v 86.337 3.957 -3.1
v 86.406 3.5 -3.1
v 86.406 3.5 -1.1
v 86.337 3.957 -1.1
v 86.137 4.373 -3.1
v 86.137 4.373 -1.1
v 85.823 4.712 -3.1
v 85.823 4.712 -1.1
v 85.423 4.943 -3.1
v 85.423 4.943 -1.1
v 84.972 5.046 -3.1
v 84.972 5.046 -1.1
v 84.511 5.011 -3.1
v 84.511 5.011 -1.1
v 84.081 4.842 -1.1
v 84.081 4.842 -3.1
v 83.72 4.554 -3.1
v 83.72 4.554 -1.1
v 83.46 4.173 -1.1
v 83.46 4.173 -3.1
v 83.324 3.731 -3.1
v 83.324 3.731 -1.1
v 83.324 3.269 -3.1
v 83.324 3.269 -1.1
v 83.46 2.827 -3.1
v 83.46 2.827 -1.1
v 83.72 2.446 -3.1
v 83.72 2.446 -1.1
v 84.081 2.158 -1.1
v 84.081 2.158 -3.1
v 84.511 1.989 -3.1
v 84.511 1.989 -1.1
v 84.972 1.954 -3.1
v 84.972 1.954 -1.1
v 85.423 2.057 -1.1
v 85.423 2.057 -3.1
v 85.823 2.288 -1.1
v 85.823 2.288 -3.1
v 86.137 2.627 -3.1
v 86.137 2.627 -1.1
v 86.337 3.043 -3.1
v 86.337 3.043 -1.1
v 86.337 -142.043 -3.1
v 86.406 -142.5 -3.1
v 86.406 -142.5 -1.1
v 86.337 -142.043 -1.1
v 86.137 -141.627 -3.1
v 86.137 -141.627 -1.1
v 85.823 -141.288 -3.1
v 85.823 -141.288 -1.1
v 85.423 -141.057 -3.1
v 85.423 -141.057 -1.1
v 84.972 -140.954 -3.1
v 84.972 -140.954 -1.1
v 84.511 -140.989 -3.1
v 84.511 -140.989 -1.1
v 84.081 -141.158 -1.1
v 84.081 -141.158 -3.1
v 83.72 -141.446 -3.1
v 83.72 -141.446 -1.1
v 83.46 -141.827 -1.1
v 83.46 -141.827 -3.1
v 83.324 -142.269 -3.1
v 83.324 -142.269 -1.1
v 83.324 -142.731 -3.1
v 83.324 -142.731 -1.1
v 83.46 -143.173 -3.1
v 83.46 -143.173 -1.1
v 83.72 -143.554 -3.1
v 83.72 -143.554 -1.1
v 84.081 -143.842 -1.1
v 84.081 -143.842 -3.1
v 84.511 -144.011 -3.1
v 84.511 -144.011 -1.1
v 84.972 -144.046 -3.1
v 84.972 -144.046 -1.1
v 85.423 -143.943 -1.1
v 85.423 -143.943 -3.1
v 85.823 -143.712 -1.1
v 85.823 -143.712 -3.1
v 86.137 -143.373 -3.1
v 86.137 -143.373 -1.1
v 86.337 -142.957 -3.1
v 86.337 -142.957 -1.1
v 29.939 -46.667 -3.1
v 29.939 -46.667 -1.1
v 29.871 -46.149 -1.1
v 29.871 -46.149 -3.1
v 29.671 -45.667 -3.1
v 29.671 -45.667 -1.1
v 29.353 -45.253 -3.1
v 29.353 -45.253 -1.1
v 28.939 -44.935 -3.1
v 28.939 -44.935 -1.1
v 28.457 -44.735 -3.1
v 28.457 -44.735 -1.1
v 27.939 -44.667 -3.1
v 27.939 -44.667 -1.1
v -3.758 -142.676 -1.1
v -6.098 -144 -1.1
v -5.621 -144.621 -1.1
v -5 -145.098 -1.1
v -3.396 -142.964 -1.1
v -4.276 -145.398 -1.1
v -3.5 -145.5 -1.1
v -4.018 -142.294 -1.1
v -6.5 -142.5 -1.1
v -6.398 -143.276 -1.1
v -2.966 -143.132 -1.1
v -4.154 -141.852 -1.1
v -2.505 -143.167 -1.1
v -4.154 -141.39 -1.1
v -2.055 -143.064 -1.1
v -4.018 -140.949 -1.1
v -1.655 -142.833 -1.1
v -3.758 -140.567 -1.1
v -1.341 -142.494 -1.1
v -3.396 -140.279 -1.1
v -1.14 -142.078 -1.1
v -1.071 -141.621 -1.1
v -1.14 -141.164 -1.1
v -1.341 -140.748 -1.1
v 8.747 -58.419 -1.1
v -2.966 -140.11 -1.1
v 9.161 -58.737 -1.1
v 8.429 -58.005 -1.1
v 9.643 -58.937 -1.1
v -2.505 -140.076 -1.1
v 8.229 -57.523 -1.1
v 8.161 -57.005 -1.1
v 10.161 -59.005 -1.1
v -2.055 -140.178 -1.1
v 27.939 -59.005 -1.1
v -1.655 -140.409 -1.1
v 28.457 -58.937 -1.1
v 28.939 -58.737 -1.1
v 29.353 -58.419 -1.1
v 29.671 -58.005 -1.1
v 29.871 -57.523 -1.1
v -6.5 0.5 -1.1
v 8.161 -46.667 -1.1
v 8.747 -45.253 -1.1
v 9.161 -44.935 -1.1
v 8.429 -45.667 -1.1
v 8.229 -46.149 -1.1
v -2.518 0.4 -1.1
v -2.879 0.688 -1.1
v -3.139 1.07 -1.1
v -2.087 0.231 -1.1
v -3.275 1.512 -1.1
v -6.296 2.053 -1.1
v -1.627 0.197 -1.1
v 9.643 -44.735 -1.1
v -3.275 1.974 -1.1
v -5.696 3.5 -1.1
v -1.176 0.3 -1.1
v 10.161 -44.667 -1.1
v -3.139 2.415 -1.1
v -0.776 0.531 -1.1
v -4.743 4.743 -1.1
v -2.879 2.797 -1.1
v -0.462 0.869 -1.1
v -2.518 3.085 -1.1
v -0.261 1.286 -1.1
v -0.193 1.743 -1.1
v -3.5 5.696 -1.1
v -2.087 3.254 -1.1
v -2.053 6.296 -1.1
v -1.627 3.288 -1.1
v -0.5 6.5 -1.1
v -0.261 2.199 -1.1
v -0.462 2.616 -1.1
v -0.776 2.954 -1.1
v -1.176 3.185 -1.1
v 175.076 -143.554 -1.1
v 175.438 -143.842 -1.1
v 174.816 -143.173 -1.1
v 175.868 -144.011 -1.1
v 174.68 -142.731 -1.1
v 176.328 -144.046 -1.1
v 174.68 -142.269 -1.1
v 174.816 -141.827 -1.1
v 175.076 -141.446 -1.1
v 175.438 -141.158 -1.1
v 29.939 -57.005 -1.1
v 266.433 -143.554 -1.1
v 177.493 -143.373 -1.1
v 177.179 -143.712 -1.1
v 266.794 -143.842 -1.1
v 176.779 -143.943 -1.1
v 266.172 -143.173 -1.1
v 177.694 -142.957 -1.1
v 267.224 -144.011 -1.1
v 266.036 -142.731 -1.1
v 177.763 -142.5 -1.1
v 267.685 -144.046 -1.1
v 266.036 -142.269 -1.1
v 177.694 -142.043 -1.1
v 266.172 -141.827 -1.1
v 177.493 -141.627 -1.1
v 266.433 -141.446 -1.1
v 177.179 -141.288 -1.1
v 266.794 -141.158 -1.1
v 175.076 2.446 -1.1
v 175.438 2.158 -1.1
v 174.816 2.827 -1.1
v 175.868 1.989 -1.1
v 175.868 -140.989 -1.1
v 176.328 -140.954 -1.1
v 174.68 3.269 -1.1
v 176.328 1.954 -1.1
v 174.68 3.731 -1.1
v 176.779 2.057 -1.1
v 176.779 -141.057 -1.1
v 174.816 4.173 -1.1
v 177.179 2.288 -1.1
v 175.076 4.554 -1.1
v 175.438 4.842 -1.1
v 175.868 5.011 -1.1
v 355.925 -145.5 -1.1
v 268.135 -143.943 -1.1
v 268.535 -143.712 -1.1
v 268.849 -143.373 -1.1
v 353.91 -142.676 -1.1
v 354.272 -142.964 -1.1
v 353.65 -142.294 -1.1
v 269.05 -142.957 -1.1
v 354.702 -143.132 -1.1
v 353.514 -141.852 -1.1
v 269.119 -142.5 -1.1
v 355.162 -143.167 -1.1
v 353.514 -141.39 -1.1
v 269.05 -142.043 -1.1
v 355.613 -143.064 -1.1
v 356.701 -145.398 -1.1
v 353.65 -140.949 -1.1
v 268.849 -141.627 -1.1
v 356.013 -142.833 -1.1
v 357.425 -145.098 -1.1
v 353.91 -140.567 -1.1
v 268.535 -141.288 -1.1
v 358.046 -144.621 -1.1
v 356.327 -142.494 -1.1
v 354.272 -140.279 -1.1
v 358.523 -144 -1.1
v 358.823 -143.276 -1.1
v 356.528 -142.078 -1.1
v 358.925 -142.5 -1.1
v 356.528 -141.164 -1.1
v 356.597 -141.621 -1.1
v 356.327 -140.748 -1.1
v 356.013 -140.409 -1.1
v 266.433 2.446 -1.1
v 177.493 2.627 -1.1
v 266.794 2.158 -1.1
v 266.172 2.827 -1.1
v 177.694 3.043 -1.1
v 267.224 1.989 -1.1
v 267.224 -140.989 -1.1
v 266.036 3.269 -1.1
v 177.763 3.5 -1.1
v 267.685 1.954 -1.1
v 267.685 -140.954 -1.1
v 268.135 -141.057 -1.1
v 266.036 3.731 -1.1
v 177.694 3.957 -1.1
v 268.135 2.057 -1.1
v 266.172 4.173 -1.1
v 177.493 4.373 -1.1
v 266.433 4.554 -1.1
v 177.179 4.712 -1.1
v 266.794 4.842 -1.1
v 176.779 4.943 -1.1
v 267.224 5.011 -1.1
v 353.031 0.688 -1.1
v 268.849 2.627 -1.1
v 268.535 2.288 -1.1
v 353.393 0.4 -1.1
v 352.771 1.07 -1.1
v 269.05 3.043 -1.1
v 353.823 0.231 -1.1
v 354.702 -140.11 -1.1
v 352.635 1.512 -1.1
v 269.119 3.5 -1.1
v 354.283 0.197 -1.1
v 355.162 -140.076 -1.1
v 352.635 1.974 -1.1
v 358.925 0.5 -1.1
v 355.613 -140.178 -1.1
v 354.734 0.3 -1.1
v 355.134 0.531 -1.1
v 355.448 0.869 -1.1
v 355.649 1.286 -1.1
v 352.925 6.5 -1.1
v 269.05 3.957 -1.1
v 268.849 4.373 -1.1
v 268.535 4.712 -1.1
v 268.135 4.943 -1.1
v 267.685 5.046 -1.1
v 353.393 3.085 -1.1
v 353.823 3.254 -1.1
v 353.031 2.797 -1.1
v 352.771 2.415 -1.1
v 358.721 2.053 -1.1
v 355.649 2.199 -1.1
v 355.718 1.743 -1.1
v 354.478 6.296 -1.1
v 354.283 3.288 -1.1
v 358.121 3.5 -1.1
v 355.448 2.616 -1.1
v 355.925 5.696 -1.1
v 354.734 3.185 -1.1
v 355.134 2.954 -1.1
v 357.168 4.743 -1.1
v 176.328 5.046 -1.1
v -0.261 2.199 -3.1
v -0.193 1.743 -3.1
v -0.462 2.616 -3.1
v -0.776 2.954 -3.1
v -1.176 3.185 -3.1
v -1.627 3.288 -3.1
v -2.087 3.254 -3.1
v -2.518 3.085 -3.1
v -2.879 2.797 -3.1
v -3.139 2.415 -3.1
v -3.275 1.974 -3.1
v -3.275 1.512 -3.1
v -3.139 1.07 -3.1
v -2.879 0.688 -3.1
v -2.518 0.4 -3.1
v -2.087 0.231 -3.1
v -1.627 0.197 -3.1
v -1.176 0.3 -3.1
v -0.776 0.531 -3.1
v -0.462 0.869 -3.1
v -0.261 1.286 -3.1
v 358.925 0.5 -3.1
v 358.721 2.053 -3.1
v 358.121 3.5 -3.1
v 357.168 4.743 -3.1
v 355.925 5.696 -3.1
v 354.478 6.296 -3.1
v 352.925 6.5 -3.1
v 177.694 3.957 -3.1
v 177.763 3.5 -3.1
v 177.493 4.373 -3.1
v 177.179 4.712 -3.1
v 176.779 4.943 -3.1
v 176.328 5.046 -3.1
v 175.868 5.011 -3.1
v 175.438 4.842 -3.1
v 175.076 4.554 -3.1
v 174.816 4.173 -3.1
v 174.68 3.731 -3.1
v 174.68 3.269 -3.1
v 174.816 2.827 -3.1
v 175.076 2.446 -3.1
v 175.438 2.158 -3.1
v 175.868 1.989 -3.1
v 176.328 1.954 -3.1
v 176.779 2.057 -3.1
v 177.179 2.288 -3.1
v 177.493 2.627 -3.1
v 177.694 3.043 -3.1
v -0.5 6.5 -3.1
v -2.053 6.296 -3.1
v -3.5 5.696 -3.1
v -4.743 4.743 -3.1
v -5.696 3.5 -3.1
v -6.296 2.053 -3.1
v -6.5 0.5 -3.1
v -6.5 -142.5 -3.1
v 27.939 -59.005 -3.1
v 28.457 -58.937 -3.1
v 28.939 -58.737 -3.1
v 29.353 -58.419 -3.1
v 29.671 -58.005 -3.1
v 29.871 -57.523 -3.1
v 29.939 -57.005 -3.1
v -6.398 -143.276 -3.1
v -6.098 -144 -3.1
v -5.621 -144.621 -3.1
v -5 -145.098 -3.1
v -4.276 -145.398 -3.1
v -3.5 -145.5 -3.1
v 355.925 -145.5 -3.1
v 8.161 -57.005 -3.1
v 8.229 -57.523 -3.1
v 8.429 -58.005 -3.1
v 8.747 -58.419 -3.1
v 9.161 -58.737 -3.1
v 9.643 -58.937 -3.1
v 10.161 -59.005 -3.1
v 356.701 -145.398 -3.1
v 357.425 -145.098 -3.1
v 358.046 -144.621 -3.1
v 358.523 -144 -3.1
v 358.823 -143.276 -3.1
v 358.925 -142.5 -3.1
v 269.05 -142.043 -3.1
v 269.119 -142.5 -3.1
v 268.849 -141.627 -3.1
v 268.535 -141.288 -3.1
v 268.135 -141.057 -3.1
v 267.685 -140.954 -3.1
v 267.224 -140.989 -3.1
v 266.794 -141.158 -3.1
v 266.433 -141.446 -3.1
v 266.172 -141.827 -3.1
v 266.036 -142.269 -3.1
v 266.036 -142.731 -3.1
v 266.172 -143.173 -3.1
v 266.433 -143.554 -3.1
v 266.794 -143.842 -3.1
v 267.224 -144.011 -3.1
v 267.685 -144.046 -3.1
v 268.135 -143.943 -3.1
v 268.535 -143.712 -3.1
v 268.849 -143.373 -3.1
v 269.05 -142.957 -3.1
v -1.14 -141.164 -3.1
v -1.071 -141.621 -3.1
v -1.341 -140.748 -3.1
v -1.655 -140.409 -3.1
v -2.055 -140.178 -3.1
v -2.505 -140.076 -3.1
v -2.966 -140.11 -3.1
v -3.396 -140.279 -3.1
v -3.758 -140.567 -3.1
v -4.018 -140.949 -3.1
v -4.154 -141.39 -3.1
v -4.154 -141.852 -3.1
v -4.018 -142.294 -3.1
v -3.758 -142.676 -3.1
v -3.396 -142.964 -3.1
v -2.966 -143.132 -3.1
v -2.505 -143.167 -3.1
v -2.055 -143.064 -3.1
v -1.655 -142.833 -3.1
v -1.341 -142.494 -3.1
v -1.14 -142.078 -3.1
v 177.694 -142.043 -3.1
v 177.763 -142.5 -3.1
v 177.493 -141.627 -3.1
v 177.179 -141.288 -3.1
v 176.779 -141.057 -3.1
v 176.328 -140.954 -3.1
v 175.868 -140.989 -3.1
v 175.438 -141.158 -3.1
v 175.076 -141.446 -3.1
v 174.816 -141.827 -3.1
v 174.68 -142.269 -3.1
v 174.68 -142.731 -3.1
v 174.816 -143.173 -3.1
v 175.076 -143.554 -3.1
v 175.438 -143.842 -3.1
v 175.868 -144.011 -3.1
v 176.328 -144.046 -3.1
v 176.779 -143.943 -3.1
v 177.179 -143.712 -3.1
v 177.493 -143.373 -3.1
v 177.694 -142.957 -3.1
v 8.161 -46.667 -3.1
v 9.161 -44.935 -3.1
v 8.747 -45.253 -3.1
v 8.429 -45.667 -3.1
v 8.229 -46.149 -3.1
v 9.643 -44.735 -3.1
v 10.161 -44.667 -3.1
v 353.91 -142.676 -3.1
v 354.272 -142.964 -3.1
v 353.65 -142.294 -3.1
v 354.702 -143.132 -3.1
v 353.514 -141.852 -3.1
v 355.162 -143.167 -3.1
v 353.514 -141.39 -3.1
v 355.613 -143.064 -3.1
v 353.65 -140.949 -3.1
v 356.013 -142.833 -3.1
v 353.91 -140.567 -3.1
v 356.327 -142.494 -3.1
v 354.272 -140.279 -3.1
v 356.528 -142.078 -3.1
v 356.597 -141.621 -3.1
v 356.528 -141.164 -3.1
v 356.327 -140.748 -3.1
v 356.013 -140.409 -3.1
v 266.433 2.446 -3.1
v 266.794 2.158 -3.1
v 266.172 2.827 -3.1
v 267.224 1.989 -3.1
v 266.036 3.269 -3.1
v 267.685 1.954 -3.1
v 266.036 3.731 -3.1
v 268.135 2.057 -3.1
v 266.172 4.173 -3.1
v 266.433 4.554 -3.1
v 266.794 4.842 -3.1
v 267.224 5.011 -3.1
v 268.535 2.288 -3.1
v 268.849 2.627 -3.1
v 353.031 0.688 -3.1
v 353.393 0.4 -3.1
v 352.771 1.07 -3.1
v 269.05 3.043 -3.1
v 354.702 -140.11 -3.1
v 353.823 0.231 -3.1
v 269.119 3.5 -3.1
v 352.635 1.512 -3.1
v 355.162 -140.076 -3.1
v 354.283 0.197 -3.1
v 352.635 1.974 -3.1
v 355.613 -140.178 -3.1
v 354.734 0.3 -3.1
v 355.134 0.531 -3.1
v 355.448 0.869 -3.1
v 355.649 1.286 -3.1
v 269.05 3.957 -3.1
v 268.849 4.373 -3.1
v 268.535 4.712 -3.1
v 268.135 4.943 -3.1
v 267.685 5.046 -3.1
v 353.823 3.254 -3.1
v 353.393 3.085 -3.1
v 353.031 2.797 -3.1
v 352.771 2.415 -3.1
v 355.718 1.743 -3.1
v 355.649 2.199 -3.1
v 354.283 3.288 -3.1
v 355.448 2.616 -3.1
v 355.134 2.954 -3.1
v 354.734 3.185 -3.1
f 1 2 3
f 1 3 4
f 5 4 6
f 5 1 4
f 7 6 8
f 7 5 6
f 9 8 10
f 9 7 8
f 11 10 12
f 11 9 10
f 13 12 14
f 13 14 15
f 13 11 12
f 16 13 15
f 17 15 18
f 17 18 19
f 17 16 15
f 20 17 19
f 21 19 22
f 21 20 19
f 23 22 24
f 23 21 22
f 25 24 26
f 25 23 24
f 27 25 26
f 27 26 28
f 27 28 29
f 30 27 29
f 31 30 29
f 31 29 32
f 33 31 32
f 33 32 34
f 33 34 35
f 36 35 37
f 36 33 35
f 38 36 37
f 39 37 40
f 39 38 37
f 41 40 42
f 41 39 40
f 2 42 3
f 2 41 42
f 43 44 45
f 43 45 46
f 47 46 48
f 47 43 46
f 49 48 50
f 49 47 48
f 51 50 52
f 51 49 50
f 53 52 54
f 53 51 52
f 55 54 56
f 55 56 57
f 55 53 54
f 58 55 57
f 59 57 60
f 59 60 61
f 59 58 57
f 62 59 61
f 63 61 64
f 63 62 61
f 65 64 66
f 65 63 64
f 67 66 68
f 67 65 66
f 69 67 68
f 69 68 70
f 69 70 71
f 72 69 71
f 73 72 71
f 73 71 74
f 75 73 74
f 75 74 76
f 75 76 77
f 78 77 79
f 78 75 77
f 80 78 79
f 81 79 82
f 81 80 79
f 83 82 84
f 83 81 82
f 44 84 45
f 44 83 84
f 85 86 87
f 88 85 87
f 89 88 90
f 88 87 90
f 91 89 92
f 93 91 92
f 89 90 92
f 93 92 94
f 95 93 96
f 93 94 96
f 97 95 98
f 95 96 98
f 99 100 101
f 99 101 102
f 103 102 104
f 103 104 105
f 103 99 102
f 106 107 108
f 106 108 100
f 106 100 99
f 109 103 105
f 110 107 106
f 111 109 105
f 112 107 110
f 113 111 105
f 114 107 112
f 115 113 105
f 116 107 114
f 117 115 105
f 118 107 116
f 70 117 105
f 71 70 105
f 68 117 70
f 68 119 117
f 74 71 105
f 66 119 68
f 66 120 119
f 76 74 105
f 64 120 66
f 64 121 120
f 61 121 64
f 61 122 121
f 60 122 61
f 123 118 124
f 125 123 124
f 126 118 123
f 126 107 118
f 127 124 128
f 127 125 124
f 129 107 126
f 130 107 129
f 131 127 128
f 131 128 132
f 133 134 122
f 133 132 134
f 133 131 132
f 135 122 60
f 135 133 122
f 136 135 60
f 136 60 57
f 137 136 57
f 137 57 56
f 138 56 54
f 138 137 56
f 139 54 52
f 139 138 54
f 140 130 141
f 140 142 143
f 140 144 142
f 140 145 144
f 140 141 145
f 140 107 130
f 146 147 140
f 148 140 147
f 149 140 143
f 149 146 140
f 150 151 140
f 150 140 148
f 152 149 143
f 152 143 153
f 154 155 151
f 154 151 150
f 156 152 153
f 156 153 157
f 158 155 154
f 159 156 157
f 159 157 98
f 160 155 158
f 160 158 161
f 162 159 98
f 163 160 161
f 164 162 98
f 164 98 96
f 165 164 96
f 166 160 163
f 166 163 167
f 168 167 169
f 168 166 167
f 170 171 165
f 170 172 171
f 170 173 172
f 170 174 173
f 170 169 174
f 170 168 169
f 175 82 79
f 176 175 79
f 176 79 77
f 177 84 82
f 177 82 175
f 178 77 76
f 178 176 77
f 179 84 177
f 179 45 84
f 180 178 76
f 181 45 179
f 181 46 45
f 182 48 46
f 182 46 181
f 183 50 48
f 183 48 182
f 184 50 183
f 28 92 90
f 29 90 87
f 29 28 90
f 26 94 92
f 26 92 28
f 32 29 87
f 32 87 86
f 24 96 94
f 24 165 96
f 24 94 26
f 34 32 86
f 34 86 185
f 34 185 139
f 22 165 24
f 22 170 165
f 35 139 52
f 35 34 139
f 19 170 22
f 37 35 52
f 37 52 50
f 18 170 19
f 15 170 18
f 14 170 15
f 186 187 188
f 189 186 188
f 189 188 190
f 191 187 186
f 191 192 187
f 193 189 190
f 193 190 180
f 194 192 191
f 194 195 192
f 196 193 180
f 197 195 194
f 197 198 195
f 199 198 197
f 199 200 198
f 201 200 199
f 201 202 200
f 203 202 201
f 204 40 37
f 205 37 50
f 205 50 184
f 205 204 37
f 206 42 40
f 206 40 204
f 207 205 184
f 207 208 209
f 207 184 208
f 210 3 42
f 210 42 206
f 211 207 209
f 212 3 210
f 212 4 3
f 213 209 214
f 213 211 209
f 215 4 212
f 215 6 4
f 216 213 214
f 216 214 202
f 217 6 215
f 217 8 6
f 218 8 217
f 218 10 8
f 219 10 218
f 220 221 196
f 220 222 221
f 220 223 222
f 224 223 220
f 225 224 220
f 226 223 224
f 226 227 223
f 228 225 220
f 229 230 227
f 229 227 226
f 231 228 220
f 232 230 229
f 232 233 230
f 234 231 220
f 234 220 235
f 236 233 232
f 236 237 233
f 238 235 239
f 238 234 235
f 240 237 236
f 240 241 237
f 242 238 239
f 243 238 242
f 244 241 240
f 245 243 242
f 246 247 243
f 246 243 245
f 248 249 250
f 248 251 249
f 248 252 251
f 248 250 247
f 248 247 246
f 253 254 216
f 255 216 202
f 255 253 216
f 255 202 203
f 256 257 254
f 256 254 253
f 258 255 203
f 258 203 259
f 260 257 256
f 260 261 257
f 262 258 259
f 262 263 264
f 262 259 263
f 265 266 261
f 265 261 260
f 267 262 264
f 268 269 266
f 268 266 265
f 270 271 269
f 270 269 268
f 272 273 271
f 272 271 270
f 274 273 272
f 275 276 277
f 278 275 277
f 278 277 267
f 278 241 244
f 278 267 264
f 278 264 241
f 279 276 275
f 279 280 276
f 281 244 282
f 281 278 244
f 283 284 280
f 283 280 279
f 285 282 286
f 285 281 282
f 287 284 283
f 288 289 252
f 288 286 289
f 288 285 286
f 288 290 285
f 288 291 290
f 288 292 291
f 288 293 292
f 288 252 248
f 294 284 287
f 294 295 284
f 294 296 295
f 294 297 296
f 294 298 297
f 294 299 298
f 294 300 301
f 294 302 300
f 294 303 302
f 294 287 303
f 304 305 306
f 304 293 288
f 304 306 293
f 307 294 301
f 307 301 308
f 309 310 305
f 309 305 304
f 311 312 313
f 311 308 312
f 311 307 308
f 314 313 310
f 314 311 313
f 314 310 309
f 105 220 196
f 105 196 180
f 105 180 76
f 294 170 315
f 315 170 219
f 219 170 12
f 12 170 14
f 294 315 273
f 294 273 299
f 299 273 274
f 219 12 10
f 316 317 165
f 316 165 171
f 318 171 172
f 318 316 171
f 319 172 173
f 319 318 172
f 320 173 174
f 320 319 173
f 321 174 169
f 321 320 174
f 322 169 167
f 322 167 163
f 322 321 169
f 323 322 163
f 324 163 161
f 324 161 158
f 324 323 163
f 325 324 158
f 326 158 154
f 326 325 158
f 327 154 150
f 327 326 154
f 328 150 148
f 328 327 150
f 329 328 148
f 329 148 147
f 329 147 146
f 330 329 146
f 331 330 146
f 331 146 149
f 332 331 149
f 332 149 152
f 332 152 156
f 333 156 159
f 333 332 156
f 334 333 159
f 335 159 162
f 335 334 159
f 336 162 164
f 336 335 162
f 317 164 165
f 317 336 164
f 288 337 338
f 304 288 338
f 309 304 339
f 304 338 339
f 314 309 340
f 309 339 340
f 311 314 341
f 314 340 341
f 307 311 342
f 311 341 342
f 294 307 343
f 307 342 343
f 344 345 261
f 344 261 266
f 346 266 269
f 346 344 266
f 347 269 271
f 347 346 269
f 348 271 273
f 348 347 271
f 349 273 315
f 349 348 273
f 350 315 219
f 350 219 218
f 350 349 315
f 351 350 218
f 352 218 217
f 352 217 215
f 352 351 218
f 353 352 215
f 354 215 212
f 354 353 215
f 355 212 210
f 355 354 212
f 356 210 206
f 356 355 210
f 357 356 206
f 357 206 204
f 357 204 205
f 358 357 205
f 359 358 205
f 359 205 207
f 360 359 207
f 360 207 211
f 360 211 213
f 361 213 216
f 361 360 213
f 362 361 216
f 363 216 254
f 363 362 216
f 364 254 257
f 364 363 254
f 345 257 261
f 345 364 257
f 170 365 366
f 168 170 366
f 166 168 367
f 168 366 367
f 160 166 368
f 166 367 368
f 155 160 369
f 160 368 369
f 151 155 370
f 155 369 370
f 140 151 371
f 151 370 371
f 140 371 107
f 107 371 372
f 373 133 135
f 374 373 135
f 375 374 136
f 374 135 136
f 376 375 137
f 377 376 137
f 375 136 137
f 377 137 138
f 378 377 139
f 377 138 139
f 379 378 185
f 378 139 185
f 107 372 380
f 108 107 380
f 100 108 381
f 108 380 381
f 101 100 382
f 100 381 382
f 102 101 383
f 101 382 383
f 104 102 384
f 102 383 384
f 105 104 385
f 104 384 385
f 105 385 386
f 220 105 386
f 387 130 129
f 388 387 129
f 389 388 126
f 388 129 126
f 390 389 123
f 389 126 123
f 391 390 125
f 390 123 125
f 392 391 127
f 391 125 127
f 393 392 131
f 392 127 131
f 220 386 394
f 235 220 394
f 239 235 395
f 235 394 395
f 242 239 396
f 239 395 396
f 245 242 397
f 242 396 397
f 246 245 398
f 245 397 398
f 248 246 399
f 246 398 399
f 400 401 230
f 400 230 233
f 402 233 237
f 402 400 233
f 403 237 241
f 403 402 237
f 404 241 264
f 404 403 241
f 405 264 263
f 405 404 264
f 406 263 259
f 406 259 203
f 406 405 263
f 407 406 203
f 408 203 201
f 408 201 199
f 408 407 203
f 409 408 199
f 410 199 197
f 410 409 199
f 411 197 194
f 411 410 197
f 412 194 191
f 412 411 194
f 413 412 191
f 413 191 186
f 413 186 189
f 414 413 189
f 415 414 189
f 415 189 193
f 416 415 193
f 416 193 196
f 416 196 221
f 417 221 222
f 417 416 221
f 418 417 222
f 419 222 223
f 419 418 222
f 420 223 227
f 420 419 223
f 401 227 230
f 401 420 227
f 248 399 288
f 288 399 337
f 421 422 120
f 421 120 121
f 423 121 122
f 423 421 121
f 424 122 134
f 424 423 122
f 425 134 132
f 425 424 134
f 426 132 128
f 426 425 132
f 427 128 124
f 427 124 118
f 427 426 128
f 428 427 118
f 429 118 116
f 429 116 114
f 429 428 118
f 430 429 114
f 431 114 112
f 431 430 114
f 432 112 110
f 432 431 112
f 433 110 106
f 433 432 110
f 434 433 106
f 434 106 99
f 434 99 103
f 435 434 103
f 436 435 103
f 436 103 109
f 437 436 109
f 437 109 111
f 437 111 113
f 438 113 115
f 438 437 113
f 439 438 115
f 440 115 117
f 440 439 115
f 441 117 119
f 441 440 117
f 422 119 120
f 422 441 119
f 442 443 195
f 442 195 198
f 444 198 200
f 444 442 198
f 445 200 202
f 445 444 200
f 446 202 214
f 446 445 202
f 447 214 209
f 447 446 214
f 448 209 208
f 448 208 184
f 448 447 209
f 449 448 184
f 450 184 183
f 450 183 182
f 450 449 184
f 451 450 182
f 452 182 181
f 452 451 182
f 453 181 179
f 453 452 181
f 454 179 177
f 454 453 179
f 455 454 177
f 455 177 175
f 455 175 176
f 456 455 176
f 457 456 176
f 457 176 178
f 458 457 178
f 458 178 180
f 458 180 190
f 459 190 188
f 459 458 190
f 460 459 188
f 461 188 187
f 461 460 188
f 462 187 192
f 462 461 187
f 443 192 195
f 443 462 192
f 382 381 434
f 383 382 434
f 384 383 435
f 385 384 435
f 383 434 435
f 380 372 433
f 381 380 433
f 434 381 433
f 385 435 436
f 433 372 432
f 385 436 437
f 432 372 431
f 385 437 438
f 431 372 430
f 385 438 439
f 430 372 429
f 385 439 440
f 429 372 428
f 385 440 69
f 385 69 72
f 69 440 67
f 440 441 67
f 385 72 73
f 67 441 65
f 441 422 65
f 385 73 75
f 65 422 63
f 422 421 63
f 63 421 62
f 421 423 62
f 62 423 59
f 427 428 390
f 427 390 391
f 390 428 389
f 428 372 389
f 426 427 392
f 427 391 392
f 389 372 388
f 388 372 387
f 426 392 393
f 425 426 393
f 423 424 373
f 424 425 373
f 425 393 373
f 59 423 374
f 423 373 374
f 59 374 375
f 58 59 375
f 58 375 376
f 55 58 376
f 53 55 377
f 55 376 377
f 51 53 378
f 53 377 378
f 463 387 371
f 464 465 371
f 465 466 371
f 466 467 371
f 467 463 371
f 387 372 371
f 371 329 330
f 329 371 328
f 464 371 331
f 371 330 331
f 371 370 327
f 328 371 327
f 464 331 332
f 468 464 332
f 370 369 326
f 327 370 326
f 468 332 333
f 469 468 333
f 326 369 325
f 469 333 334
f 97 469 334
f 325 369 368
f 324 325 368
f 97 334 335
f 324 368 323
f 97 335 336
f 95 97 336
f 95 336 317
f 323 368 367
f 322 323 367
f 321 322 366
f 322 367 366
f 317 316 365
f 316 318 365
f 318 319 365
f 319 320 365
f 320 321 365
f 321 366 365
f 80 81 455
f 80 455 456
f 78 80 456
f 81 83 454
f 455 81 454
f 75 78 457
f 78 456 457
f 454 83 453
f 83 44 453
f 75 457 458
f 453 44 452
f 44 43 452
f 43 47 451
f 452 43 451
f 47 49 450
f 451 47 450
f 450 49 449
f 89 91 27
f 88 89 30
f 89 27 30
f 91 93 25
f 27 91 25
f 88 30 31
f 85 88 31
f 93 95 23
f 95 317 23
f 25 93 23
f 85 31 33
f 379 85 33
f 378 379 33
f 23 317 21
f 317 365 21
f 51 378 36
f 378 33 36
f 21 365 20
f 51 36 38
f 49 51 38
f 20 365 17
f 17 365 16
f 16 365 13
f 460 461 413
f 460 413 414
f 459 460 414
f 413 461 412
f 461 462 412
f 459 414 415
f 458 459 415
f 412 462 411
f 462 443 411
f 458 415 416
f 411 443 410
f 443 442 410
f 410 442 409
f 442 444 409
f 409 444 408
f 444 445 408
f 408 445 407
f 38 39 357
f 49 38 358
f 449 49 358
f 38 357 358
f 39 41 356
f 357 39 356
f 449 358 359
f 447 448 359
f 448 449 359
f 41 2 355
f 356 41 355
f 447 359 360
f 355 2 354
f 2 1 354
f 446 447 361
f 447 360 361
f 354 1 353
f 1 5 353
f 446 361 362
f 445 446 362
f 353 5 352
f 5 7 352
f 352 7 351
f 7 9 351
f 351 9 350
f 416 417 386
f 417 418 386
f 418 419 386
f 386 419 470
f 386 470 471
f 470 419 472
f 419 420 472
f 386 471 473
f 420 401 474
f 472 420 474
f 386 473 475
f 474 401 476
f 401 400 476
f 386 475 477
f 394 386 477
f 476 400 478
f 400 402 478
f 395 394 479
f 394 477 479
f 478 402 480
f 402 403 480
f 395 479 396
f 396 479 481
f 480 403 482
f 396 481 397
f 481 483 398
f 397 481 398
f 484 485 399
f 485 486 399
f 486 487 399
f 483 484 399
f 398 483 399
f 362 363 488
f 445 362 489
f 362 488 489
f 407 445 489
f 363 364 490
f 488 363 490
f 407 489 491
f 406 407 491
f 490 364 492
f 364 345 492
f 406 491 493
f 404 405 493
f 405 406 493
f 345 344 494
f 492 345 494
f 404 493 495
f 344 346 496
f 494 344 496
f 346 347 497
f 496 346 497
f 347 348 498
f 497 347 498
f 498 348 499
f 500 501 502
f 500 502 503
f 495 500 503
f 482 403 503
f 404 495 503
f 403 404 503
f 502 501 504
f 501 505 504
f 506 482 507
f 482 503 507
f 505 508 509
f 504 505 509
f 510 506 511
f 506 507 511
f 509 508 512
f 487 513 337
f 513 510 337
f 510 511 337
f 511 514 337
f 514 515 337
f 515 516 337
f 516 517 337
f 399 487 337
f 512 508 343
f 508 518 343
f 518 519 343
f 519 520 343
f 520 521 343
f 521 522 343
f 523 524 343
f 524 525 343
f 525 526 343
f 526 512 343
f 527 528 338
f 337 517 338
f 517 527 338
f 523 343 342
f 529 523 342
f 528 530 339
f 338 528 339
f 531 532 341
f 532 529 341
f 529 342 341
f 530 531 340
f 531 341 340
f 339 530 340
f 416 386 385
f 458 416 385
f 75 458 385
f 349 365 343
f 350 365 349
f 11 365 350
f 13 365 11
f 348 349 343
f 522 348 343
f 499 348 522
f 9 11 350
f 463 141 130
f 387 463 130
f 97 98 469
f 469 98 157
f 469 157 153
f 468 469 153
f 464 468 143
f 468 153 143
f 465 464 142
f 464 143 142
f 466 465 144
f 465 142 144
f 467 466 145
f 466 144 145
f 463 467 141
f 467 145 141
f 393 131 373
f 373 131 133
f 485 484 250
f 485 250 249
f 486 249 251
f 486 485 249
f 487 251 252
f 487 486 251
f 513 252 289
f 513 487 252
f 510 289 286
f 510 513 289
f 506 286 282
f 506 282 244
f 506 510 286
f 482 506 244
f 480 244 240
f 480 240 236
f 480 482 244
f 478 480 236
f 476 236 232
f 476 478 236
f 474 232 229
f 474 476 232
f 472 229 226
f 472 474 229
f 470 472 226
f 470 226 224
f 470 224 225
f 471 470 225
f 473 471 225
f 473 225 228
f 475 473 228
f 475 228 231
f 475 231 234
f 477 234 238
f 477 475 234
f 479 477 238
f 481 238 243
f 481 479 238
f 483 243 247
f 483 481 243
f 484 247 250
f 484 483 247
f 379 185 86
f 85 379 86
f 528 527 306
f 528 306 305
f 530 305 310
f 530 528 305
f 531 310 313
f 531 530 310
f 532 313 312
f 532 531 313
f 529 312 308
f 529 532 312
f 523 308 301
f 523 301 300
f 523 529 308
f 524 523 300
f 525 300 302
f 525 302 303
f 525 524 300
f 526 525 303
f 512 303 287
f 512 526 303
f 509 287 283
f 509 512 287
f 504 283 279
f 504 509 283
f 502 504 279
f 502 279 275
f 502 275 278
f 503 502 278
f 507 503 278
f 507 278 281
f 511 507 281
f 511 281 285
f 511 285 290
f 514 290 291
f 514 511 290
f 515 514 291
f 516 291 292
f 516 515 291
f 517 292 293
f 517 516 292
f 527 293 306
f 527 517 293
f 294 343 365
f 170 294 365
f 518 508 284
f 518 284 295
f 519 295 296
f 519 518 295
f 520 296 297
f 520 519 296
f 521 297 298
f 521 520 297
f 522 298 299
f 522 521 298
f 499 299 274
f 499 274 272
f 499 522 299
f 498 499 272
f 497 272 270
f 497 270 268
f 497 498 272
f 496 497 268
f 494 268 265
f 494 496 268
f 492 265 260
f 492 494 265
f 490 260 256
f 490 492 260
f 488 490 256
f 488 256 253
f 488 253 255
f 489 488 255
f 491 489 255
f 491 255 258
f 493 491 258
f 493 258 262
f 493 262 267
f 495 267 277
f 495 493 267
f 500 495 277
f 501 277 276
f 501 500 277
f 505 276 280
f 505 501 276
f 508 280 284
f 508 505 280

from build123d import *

# Parameters (mm, degrees)
SKETCH076_R     = 1.55
PAD015_DEPTH    = 2
POCKET060_DEPTH = 5
SKETCH078_R     = 1.55
POCKET061_DEPTH = 1
SKETCH079_R     = 4.05
POCKET062_DEPTH = 1


with BuildPart() as part:
    # Sketch076 → Pad015 (new body)
    with BuildSketch(Plane.XY.offset(2.9)):
        with BuildLine():
            Line((-6.5, 0.5), (-6.5, -142.5))
            ThreePointArc((-6.5, -142.5), (-5.62132, -144.62132), (-3.5, -145.5))
            Line((-3.5, -145.5), (355.925, -145.5))
            ThreePointArc((355.925, -145.5), (358.04632, -144.62132), (358.925, -142.5))
            Line((358.925, -142.5), (358.925, 0.5))
            ThreePointArc((358.925, 0.5), (357.167641, 4.742641), (352.925, 6.5))
            Line((352.925, 6.5), (-0.5, 6.5))
            ThreePointArc((-0.5, 6.5), (-4.742641, 4.742641), (-6.5, 0.5))
        make_face()
        with Locations((-1.742592, 1.742608)):
            Circle(SKETCH076_R, mode=Mode.SUBTRACT)
        with Locations((354.167592, 1.742608)):
            Circle(SKETCH076_R, mode=Mode.SUBTRACT)
        with Locations((84.85625, 3.5)):
            Circle(SKETCH076_R, mode=Mode.SUBTRACT)
        with Locations((176.2125, 3.5)):
            Circle(SKETCH076_R, mode=Mode.SUBTRACT)
        with Locations((267.56875, 3.5)):
            Circle(SKETCH076_R, mode=Mode.SUBTRACT)
        with Locations((84.85625, -142.5)):
            Circle(SKETCH076_R, mode=Mode.SUBTRACT)
        with Locations((176.2125, -142.5)):
            Circle(SKETCH076_R, mode=Mode.SUBTRACT)
        with Locations((267.56875, -142.5)):
            Circle(SKETCH076_R, mode=Mode.SUBTRACT)
        with Locations((-2.621271, -141.621287)):
            Circle(SKETCH076_R, mode=Mode.SUBTRACT)
        with Locations((355.046623, -141.621325)):
            Circle(SKETCH076_R, mode=Mode.SUBTRACT)
    extrude(amount=PAD015_DEPTH)

    # Sketch077 → Pocket060 (cut)
    with BuildSketch(Plane.XY.offset(6)):
        with BuildLine():
            Line((8.160893, -46.667019), (8.160893, -57.005055))
            ThreePointArc((8.160893, -57.005055), (8.74668, -58.419268), (10.160893, -59.005055))
            Line((10.160893, -59.005055), (27.939107, -59.005055))
            ThreePointArc((27.939107, -59.005055), (29.35332, -58.419268), (29.939107, -57.005055))
            Line((29.939107, -57.005055), (29.939107, -46.667019))
            ThreePointArc((29.939107, -46.667019), (29.35332, -45.252805), (27.939107, -44.667019))
            Line((27.939107, -44.667019), (10.160893, -44.667019))
            ThreePointArc((10.160893, -44.667019), (8.74668, -45.252805), (8.160893, -46.667019))
        make_face()
    extrude(amount=-POCKET060_DEPTH, mode=Mode.SUBTRACT)

    # Sketch078 → Pocket061 (cut)
    with BuildSketch(Plane.XY.offset(6)):
        with Locations((84.85625, -142.5)):
            Circle(SKETCH078_R)
        with Locations((176.2125, -142.5)):
            Circle(SKETCH078_R)
        with Locations((267.56875, -142.5)):
            Circle(SKETCH078_R)
        with Locations((-2.621271, -141.621287)):
            Circle(SKETCH078_R)
        with Locations((355.046623, -141.621325)):
            Circle(SKETCH078_R)
    extrude(amount=-POCKET061_DEPTH, mode=Mode.SUBTRACT)

    # Sketch079 → Pocket062 (cut)
    with BuildSketch(Plane.XY.offset(2.9)):
        with Locations((5.011405, -127.899292)):
            Circle(SKETCH079_R)
        with Locations((347.413595, -127.899292)):
            Circle(SKETCH079_R)
    extrude(amount=-POCKET062_DEPTH, mode=Mode.SUBTRACT)


with BuildPart() as part_1:
    # Body015 placement: moved
    add(part.part.moved(Location((0, 0, -6))))


solid = part_1.part
